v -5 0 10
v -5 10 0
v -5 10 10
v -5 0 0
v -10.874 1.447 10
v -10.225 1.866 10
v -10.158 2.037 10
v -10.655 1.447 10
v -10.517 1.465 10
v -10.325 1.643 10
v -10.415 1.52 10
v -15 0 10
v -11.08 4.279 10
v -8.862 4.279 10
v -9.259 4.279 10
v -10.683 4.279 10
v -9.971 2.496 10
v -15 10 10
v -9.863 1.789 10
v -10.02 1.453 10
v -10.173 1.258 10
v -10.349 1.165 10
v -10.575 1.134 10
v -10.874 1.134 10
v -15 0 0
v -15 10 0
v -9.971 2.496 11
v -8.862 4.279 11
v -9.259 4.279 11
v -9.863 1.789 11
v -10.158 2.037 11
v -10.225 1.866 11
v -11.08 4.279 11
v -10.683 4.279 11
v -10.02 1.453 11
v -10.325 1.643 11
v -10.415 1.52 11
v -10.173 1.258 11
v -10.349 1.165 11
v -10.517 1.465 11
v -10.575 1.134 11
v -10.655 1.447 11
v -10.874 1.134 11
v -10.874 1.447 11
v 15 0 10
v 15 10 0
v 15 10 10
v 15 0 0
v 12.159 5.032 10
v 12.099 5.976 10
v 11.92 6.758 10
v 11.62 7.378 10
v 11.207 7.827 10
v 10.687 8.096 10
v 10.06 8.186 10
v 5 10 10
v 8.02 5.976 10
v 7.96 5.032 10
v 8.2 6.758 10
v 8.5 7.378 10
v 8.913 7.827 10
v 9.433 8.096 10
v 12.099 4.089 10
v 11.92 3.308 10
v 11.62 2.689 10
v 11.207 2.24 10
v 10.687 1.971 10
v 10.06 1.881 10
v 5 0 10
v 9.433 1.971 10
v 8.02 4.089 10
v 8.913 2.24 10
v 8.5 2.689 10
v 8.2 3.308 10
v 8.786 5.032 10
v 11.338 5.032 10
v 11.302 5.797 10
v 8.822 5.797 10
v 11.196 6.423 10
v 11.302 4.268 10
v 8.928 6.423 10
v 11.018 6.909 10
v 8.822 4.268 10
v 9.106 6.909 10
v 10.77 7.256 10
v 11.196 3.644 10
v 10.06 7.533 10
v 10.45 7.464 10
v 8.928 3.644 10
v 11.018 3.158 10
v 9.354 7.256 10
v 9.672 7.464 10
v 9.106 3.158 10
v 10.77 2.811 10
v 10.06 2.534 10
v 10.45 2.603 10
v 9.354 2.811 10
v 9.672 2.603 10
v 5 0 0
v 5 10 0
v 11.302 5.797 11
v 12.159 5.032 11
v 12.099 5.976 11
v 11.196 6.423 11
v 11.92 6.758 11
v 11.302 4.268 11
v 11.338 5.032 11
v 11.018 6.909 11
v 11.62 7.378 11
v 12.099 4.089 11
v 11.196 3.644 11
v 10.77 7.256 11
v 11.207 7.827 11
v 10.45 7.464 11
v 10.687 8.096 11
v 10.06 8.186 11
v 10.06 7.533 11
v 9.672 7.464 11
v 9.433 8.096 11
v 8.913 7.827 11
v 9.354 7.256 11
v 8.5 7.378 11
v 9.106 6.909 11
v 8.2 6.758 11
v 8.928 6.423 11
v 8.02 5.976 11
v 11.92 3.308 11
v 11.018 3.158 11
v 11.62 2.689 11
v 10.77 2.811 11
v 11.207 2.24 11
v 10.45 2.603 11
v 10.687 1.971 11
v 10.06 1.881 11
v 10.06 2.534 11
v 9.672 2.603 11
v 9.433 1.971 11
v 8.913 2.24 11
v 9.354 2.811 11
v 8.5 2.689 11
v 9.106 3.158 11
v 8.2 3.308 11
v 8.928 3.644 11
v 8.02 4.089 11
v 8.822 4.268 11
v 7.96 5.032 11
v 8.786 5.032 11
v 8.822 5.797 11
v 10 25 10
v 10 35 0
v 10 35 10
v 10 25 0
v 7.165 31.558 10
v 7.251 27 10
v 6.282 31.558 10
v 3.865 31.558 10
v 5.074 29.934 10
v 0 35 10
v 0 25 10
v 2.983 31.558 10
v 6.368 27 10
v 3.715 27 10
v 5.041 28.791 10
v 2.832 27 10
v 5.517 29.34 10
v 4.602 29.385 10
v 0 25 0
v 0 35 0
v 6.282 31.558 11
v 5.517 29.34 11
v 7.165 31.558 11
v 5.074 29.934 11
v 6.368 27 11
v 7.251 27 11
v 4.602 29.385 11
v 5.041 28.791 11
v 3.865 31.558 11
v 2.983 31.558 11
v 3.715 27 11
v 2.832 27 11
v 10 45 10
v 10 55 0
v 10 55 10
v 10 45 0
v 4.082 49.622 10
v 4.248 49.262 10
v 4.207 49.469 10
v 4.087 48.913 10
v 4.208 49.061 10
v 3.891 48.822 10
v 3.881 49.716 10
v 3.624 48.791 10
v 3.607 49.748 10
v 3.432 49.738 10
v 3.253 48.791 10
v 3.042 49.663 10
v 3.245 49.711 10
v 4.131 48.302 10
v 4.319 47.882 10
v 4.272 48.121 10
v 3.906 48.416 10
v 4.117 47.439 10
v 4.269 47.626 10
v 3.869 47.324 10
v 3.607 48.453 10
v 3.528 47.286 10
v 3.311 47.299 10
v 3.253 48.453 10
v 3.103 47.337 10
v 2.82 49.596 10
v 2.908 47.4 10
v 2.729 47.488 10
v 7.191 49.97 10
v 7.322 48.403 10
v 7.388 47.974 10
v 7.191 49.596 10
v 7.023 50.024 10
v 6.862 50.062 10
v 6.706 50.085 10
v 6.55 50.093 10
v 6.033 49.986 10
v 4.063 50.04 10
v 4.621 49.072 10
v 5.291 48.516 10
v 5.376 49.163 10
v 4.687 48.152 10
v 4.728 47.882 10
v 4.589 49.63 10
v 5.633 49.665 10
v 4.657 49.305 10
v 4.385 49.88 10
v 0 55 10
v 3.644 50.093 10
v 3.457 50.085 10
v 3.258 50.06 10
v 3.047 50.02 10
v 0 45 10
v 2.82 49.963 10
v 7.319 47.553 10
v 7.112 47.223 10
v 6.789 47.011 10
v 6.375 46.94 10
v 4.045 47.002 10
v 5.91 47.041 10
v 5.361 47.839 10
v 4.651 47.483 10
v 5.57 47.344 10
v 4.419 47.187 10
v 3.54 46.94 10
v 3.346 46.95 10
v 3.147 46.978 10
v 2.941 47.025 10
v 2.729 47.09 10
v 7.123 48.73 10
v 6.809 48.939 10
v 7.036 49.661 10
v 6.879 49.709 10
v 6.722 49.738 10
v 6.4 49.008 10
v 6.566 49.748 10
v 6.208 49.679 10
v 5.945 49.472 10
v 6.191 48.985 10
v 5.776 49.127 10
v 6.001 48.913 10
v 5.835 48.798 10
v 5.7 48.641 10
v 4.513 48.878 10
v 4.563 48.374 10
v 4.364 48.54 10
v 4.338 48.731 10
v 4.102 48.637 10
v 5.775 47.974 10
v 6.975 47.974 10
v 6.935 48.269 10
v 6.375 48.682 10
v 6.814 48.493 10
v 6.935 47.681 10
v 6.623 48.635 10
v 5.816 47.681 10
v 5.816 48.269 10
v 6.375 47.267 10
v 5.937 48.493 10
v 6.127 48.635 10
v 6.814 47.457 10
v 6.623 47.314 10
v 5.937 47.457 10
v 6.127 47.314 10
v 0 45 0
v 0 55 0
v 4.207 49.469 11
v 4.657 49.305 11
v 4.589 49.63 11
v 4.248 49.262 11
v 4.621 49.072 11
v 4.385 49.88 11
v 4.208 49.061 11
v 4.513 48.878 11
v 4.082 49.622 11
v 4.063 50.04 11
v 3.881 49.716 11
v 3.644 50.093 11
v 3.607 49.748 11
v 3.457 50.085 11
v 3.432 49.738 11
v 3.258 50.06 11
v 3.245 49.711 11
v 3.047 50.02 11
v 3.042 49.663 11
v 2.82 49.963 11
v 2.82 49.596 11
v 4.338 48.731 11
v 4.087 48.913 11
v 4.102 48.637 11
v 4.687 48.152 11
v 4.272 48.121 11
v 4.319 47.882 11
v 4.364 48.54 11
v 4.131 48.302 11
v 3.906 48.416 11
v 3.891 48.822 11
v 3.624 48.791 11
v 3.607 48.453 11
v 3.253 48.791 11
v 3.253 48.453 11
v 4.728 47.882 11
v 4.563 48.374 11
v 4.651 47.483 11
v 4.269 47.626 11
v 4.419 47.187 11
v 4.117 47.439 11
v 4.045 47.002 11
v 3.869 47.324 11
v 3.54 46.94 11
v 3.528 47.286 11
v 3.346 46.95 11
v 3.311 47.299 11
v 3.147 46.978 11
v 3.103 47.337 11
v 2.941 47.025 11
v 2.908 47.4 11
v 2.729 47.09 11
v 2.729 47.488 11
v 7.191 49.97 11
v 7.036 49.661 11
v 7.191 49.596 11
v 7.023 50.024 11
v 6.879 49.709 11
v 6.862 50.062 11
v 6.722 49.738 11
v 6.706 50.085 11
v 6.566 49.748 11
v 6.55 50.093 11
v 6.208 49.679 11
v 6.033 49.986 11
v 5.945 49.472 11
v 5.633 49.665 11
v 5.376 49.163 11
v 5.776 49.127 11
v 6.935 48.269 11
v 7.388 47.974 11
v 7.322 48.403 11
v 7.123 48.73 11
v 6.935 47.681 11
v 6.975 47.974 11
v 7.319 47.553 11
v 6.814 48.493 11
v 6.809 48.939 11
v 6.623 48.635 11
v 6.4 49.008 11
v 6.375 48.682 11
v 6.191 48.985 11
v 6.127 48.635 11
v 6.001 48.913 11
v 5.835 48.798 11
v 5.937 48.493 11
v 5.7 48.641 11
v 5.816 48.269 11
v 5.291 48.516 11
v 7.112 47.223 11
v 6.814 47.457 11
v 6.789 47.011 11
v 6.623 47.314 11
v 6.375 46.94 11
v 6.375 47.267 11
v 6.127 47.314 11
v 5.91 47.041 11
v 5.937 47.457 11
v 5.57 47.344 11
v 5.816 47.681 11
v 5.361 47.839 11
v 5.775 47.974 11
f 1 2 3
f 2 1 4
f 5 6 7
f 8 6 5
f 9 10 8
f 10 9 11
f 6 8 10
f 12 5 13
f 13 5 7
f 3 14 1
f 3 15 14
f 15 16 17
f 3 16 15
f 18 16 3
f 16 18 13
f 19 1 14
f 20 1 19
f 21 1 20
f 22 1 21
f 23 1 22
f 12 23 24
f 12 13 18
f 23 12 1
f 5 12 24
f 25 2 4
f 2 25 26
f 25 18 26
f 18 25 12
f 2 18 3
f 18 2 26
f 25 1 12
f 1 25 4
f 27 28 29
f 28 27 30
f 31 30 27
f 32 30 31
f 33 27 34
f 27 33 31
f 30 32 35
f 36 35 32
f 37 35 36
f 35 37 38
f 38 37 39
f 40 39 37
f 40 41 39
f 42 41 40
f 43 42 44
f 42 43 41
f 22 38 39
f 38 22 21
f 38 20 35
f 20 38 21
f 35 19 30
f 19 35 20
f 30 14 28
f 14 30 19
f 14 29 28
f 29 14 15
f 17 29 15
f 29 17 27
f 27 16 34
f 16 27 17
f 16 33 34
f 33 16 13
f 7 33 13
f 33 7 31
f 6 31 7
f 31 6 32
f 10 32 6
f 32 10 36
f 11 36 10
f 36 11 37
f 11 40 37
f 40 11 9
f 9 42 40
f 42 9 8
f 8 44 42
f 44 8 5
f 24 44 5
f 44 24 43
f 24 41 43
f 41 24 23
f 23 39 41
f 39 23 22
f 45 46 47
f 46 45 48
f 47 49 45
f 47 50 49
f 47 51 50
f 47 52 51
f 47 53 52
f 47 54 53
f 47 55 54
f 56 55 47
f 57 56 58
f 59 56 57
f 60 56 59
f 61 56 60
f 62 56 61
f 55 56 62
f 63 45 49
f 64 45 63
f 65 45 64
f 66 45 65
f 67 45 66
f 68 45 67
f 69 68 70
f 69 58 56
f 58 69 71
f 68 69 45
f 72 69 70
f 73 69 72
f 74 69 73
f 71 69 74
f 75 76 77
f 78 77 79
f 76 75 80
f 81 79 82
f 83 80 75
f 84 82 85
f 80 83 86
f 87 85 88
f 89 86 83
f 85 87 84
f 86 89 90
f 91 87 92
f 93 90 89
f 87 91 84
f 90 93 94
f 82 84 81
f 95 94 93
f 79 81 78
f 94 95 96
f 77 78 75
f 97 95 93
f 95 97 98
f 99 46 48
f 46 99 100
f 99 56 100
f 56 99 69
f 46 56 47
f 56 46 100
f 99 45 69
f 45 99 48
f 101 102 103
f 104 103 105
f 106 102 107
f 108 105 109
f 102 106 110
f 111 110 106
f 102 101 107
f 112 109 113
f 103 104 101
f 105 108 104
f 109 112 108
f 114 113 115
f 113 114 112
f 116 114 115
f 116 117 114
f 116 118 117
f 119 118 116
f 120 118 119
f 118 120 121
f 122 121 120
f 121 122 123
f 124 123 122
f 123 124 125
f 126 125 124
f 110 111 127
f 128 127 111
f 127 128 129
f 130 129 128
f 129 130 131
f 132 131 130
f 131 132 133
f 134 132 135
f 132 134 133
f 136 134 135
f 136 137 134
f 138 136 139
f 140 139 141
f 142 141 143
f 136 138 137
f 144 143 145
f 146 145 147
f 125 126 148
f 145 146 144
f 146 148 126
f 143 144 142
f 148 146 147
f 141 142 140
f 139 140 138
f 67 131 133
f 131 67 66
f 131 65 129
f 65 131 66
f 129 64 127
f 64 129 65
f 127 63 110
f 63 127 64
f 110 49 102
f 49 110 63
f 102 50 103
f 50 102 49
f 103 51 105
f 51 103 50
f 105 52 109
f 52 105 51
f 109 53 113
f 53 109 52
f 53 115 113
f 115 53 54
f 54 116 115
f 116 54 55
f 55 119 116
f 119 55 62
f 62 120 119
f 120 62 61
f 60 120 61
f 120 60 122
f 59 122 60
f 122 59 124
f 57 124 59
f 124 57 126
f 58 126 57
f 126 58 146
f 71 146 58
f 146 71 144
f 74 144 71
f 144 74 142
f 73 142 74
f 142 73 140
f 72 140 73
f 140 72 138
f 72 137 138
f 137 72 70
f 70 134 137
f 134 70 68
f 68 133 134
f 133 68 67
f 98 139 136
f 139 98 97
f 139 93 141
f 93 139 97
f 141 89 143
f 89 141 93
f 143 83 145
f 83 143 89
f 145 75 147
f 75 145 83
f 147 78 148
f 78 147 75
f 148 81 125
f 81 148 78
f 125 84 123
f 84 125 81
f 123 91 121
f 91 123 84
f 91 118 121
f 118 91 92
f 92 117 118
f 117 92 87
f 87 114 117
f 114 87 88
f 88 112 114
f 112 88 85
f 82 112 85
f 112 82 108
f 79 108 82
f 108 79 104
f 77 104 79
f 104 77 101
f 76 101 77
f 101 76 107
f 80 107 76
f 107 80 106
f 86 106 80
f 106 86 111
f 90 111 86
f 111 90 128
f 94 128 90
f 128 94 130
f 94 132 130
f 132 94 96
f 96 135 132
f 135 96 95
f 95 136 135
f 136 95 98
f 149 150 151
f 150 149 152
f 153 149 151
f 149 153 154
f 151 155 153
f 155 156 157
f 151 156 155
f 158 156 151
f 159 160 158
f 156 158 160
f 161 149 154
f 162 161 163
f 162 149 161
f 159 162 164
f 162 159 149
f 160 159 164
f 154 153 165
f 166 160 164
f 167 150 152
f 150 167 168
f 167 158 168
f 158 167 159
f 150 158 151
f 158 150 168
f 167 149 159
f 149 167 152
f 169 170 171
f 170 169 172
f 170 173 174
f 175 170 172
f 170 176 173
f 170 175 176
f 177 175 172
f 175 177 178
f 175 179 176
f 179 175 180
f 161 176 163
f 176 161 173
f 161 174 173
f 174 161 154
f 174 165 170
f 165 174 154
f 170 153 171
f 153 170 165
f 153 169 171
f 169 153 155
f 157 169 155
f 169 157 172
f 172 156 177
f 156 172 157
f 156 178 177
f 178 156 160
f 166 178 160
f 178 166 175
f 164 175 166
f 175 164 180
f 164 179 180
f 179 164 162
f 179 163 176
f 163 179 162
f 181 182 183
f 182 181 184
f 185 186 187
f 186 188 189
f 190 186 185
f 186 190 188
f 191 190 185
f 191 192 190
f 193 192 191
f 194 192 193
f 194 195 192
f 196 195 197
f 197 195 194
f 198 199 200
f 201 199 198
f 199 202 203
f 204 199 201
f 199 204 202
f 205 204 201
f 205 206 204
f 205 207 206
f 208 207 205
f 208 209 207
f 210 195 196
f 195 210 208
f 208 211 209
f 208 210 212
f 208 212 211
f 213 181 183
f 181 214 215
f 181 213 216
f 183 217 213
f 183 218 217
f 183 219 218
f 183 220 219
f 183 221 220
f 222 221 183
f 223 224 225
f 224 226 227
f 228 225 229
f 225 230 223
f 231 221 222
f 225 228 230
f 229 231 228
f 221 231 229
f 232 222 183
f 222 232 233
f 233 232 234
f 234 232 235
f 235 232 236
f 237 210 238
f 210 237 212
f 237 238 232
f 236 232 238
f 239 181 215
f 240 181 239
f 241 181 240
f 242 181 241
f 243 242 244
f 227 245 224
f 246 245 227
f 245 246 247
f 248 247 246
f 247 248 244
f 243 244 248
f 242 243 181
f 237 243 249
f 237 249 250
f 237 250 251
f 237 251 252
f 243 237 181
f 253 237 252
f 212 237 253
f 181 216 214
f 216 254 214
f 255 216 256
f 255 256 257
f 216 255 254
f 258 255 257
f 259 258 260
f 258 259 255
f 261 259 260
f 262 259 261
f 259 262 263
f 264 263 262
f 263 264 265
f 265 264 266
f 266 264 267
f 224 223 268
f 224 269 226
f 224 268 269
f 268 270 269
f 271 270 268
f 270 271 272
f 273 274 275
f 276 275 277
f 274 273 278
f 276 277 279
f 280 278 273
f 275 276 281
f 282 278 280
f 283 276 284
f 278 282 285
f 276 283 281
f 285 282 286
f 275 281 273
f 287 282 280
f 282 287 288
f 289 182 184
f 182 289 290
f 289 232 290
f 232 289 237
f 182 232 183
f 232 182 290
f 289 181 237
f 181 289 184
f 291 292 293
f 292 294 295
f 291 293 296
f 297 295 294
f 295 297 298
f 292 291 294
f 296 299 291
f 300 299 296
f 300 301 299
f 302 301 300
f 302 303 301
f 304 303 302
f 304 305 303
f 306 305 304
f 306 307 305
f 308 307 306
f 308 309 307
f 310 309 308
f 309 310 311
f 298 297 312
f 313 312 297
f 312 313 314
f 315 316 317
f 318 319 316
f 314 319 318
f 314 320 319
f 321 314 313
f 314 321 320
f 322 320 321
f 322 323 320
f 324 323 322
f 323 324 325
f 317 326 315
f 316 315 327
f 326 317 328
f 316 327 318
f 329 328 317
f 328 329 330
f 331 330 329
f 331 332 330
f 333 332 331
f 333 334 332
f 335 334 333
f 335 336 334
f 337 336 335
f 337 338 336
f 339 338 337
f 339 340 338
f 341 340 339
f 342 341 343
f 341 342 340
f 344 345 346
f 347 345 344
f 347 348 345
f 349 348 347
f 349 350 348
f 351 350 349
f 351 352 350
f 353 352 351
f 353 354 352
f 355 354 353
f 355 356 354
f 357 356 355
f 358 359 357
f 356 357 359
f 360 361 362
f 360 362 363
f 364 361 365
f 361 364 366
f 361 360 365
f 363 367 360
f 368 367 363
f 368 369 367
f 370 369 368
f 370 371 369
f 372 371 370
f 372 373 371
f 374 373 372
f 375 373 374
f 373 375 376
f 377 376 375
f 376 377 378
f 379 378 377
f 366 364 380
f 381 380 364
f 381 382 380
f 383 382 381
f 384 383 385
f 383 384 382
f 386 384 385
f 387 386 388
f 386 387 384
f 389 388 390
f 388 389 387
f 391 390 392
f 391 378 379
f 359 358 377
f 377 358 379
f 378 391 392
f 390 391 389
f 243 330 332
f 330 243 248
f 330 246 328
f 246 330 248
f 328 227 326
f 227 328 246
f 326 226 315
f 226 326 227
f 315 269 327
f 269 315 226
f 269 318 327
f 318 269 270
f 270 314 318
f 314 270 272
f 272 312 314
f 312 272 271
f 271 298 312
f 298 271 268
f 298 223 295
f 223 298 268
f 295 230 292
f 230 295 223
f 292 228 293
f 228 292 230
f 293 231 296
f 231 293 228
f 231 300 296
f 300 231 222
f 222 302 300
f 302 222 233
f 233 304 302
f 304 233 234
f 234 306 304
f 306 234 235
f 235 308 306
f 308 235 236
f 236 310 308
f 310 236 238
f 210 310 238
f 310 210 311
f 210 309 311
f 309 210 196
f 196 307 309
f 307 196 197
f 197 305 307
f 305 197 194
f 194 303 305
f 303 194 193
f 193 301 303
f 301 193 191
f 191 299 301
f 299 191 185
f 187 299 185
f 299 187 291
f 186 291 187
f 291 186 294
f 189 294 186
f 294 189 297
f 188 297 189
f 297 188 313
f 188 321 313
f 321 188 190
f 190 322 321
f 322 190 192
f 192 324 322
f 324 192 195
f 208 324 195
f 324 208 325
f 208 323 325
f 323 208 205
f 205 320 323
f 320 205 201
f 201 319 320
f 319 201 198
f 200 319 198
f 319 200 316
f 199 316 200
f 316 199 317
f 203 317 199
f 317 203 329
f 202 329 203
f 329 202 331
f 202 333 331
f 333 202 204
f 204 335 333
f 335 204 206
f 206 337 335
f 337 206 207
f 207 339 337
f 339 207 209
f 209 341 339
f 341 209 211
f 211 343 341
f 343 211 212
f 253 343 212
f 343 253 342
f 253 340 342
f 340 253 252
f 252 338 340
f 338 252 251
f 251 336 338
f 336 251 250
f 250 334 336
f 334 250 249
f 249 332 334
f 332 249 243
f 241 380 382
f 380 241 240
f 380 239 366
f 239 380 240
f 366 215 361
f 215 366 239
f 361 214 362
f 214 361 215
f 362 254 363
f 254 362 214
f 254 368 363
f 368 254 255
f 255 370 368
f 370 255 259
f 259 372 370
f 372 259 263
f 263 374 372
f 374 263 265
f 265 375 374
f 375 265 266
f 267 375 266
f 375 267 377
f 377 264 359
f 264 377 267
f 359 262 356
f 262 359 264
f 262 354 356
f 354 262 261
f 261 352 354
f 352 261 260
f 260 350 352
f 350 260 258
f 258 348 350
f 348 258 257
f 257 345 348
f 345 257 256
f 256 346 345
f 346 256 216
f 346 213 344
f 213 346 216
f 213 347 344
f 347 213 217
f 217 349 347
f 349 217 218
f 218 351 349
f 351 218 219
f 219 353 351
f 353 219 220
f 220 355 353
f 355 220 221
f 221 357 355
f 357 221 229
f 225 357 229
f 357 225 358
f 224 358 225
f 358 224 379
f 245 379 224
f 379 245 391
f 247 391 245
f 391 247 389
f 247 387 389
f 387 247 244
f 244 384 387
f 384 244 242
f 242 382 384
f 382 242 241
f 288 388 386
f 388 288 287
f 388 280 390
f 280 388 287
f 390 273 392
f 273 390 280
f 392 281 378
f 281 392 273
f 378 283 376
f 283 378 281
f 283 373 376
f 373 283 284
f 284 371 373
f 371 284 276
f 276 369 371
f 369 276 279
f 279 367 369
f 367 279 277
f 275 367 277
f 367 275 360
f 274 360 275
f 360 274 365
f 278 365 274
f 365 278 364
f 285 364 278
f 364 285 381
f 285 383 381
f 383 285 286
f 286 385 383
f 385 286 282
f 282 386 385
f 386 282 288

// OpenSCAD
// -*- mode: SCAD ; c-file-style: "ellemtel" ; coding: utf-8 -*-
//
// Rough extruder offest calibration
// Extruder one part
// Just a few simple blocks
//
// © 2017 Roland Sieker <ospalh@gmail.com>
// Licence: CC-BY-SA 4.0



// Change this to fit your actual printer, as well as you know
nozzle_offset_x = 36;
nozzle_offset_y = 0.0;



font_name = "Demos LT";
// font_name = "Palatino";
// font_name = "serif";
// font_name = "bugger, haven’t got this one";
font_name_2 = "Demos X";
font_name_3 = "serif";
some_distance = 40;



// Y
translate([-15, 0, 0])
{
   cube([10,10,10]);
   translate([5, 2, 10])
   {
      linear_extrude(1)
      {
         text(text="y", size=3, font=font_name, halign="center",
              valgin="center");
      }
   }
}
translate([5, 0, 0])
{
   cube([10,10,10]);
   translate([5, 2, 10])
   {
      linear_extrude(1)
      {
         text(text=str(nozzle_offset_y), size=6, font=font_name_2,
              halign="center", valgin="center");
      }
   }
}



// X


translate([0, some_distance,0])
{
   translate([0, -15, 0])
   {
      cube([10,10,10]);
      translate([5, 2, 10])
      {
         linear_extrude(1)
         {
            text("x", 6, font=font_name, halign="center", valgin="center");
         }
      }
   }
   translate([0, 5, 0])
   {
      cube([10,10,10]);
      translate([5, 2, 10])
      {
         linear_extrude(1)
         {
            text(text=str(nozzle_offset_x), size=3, font=font_name_2,
                 halign="center", valgin="center");
         }
      }
   }

}
